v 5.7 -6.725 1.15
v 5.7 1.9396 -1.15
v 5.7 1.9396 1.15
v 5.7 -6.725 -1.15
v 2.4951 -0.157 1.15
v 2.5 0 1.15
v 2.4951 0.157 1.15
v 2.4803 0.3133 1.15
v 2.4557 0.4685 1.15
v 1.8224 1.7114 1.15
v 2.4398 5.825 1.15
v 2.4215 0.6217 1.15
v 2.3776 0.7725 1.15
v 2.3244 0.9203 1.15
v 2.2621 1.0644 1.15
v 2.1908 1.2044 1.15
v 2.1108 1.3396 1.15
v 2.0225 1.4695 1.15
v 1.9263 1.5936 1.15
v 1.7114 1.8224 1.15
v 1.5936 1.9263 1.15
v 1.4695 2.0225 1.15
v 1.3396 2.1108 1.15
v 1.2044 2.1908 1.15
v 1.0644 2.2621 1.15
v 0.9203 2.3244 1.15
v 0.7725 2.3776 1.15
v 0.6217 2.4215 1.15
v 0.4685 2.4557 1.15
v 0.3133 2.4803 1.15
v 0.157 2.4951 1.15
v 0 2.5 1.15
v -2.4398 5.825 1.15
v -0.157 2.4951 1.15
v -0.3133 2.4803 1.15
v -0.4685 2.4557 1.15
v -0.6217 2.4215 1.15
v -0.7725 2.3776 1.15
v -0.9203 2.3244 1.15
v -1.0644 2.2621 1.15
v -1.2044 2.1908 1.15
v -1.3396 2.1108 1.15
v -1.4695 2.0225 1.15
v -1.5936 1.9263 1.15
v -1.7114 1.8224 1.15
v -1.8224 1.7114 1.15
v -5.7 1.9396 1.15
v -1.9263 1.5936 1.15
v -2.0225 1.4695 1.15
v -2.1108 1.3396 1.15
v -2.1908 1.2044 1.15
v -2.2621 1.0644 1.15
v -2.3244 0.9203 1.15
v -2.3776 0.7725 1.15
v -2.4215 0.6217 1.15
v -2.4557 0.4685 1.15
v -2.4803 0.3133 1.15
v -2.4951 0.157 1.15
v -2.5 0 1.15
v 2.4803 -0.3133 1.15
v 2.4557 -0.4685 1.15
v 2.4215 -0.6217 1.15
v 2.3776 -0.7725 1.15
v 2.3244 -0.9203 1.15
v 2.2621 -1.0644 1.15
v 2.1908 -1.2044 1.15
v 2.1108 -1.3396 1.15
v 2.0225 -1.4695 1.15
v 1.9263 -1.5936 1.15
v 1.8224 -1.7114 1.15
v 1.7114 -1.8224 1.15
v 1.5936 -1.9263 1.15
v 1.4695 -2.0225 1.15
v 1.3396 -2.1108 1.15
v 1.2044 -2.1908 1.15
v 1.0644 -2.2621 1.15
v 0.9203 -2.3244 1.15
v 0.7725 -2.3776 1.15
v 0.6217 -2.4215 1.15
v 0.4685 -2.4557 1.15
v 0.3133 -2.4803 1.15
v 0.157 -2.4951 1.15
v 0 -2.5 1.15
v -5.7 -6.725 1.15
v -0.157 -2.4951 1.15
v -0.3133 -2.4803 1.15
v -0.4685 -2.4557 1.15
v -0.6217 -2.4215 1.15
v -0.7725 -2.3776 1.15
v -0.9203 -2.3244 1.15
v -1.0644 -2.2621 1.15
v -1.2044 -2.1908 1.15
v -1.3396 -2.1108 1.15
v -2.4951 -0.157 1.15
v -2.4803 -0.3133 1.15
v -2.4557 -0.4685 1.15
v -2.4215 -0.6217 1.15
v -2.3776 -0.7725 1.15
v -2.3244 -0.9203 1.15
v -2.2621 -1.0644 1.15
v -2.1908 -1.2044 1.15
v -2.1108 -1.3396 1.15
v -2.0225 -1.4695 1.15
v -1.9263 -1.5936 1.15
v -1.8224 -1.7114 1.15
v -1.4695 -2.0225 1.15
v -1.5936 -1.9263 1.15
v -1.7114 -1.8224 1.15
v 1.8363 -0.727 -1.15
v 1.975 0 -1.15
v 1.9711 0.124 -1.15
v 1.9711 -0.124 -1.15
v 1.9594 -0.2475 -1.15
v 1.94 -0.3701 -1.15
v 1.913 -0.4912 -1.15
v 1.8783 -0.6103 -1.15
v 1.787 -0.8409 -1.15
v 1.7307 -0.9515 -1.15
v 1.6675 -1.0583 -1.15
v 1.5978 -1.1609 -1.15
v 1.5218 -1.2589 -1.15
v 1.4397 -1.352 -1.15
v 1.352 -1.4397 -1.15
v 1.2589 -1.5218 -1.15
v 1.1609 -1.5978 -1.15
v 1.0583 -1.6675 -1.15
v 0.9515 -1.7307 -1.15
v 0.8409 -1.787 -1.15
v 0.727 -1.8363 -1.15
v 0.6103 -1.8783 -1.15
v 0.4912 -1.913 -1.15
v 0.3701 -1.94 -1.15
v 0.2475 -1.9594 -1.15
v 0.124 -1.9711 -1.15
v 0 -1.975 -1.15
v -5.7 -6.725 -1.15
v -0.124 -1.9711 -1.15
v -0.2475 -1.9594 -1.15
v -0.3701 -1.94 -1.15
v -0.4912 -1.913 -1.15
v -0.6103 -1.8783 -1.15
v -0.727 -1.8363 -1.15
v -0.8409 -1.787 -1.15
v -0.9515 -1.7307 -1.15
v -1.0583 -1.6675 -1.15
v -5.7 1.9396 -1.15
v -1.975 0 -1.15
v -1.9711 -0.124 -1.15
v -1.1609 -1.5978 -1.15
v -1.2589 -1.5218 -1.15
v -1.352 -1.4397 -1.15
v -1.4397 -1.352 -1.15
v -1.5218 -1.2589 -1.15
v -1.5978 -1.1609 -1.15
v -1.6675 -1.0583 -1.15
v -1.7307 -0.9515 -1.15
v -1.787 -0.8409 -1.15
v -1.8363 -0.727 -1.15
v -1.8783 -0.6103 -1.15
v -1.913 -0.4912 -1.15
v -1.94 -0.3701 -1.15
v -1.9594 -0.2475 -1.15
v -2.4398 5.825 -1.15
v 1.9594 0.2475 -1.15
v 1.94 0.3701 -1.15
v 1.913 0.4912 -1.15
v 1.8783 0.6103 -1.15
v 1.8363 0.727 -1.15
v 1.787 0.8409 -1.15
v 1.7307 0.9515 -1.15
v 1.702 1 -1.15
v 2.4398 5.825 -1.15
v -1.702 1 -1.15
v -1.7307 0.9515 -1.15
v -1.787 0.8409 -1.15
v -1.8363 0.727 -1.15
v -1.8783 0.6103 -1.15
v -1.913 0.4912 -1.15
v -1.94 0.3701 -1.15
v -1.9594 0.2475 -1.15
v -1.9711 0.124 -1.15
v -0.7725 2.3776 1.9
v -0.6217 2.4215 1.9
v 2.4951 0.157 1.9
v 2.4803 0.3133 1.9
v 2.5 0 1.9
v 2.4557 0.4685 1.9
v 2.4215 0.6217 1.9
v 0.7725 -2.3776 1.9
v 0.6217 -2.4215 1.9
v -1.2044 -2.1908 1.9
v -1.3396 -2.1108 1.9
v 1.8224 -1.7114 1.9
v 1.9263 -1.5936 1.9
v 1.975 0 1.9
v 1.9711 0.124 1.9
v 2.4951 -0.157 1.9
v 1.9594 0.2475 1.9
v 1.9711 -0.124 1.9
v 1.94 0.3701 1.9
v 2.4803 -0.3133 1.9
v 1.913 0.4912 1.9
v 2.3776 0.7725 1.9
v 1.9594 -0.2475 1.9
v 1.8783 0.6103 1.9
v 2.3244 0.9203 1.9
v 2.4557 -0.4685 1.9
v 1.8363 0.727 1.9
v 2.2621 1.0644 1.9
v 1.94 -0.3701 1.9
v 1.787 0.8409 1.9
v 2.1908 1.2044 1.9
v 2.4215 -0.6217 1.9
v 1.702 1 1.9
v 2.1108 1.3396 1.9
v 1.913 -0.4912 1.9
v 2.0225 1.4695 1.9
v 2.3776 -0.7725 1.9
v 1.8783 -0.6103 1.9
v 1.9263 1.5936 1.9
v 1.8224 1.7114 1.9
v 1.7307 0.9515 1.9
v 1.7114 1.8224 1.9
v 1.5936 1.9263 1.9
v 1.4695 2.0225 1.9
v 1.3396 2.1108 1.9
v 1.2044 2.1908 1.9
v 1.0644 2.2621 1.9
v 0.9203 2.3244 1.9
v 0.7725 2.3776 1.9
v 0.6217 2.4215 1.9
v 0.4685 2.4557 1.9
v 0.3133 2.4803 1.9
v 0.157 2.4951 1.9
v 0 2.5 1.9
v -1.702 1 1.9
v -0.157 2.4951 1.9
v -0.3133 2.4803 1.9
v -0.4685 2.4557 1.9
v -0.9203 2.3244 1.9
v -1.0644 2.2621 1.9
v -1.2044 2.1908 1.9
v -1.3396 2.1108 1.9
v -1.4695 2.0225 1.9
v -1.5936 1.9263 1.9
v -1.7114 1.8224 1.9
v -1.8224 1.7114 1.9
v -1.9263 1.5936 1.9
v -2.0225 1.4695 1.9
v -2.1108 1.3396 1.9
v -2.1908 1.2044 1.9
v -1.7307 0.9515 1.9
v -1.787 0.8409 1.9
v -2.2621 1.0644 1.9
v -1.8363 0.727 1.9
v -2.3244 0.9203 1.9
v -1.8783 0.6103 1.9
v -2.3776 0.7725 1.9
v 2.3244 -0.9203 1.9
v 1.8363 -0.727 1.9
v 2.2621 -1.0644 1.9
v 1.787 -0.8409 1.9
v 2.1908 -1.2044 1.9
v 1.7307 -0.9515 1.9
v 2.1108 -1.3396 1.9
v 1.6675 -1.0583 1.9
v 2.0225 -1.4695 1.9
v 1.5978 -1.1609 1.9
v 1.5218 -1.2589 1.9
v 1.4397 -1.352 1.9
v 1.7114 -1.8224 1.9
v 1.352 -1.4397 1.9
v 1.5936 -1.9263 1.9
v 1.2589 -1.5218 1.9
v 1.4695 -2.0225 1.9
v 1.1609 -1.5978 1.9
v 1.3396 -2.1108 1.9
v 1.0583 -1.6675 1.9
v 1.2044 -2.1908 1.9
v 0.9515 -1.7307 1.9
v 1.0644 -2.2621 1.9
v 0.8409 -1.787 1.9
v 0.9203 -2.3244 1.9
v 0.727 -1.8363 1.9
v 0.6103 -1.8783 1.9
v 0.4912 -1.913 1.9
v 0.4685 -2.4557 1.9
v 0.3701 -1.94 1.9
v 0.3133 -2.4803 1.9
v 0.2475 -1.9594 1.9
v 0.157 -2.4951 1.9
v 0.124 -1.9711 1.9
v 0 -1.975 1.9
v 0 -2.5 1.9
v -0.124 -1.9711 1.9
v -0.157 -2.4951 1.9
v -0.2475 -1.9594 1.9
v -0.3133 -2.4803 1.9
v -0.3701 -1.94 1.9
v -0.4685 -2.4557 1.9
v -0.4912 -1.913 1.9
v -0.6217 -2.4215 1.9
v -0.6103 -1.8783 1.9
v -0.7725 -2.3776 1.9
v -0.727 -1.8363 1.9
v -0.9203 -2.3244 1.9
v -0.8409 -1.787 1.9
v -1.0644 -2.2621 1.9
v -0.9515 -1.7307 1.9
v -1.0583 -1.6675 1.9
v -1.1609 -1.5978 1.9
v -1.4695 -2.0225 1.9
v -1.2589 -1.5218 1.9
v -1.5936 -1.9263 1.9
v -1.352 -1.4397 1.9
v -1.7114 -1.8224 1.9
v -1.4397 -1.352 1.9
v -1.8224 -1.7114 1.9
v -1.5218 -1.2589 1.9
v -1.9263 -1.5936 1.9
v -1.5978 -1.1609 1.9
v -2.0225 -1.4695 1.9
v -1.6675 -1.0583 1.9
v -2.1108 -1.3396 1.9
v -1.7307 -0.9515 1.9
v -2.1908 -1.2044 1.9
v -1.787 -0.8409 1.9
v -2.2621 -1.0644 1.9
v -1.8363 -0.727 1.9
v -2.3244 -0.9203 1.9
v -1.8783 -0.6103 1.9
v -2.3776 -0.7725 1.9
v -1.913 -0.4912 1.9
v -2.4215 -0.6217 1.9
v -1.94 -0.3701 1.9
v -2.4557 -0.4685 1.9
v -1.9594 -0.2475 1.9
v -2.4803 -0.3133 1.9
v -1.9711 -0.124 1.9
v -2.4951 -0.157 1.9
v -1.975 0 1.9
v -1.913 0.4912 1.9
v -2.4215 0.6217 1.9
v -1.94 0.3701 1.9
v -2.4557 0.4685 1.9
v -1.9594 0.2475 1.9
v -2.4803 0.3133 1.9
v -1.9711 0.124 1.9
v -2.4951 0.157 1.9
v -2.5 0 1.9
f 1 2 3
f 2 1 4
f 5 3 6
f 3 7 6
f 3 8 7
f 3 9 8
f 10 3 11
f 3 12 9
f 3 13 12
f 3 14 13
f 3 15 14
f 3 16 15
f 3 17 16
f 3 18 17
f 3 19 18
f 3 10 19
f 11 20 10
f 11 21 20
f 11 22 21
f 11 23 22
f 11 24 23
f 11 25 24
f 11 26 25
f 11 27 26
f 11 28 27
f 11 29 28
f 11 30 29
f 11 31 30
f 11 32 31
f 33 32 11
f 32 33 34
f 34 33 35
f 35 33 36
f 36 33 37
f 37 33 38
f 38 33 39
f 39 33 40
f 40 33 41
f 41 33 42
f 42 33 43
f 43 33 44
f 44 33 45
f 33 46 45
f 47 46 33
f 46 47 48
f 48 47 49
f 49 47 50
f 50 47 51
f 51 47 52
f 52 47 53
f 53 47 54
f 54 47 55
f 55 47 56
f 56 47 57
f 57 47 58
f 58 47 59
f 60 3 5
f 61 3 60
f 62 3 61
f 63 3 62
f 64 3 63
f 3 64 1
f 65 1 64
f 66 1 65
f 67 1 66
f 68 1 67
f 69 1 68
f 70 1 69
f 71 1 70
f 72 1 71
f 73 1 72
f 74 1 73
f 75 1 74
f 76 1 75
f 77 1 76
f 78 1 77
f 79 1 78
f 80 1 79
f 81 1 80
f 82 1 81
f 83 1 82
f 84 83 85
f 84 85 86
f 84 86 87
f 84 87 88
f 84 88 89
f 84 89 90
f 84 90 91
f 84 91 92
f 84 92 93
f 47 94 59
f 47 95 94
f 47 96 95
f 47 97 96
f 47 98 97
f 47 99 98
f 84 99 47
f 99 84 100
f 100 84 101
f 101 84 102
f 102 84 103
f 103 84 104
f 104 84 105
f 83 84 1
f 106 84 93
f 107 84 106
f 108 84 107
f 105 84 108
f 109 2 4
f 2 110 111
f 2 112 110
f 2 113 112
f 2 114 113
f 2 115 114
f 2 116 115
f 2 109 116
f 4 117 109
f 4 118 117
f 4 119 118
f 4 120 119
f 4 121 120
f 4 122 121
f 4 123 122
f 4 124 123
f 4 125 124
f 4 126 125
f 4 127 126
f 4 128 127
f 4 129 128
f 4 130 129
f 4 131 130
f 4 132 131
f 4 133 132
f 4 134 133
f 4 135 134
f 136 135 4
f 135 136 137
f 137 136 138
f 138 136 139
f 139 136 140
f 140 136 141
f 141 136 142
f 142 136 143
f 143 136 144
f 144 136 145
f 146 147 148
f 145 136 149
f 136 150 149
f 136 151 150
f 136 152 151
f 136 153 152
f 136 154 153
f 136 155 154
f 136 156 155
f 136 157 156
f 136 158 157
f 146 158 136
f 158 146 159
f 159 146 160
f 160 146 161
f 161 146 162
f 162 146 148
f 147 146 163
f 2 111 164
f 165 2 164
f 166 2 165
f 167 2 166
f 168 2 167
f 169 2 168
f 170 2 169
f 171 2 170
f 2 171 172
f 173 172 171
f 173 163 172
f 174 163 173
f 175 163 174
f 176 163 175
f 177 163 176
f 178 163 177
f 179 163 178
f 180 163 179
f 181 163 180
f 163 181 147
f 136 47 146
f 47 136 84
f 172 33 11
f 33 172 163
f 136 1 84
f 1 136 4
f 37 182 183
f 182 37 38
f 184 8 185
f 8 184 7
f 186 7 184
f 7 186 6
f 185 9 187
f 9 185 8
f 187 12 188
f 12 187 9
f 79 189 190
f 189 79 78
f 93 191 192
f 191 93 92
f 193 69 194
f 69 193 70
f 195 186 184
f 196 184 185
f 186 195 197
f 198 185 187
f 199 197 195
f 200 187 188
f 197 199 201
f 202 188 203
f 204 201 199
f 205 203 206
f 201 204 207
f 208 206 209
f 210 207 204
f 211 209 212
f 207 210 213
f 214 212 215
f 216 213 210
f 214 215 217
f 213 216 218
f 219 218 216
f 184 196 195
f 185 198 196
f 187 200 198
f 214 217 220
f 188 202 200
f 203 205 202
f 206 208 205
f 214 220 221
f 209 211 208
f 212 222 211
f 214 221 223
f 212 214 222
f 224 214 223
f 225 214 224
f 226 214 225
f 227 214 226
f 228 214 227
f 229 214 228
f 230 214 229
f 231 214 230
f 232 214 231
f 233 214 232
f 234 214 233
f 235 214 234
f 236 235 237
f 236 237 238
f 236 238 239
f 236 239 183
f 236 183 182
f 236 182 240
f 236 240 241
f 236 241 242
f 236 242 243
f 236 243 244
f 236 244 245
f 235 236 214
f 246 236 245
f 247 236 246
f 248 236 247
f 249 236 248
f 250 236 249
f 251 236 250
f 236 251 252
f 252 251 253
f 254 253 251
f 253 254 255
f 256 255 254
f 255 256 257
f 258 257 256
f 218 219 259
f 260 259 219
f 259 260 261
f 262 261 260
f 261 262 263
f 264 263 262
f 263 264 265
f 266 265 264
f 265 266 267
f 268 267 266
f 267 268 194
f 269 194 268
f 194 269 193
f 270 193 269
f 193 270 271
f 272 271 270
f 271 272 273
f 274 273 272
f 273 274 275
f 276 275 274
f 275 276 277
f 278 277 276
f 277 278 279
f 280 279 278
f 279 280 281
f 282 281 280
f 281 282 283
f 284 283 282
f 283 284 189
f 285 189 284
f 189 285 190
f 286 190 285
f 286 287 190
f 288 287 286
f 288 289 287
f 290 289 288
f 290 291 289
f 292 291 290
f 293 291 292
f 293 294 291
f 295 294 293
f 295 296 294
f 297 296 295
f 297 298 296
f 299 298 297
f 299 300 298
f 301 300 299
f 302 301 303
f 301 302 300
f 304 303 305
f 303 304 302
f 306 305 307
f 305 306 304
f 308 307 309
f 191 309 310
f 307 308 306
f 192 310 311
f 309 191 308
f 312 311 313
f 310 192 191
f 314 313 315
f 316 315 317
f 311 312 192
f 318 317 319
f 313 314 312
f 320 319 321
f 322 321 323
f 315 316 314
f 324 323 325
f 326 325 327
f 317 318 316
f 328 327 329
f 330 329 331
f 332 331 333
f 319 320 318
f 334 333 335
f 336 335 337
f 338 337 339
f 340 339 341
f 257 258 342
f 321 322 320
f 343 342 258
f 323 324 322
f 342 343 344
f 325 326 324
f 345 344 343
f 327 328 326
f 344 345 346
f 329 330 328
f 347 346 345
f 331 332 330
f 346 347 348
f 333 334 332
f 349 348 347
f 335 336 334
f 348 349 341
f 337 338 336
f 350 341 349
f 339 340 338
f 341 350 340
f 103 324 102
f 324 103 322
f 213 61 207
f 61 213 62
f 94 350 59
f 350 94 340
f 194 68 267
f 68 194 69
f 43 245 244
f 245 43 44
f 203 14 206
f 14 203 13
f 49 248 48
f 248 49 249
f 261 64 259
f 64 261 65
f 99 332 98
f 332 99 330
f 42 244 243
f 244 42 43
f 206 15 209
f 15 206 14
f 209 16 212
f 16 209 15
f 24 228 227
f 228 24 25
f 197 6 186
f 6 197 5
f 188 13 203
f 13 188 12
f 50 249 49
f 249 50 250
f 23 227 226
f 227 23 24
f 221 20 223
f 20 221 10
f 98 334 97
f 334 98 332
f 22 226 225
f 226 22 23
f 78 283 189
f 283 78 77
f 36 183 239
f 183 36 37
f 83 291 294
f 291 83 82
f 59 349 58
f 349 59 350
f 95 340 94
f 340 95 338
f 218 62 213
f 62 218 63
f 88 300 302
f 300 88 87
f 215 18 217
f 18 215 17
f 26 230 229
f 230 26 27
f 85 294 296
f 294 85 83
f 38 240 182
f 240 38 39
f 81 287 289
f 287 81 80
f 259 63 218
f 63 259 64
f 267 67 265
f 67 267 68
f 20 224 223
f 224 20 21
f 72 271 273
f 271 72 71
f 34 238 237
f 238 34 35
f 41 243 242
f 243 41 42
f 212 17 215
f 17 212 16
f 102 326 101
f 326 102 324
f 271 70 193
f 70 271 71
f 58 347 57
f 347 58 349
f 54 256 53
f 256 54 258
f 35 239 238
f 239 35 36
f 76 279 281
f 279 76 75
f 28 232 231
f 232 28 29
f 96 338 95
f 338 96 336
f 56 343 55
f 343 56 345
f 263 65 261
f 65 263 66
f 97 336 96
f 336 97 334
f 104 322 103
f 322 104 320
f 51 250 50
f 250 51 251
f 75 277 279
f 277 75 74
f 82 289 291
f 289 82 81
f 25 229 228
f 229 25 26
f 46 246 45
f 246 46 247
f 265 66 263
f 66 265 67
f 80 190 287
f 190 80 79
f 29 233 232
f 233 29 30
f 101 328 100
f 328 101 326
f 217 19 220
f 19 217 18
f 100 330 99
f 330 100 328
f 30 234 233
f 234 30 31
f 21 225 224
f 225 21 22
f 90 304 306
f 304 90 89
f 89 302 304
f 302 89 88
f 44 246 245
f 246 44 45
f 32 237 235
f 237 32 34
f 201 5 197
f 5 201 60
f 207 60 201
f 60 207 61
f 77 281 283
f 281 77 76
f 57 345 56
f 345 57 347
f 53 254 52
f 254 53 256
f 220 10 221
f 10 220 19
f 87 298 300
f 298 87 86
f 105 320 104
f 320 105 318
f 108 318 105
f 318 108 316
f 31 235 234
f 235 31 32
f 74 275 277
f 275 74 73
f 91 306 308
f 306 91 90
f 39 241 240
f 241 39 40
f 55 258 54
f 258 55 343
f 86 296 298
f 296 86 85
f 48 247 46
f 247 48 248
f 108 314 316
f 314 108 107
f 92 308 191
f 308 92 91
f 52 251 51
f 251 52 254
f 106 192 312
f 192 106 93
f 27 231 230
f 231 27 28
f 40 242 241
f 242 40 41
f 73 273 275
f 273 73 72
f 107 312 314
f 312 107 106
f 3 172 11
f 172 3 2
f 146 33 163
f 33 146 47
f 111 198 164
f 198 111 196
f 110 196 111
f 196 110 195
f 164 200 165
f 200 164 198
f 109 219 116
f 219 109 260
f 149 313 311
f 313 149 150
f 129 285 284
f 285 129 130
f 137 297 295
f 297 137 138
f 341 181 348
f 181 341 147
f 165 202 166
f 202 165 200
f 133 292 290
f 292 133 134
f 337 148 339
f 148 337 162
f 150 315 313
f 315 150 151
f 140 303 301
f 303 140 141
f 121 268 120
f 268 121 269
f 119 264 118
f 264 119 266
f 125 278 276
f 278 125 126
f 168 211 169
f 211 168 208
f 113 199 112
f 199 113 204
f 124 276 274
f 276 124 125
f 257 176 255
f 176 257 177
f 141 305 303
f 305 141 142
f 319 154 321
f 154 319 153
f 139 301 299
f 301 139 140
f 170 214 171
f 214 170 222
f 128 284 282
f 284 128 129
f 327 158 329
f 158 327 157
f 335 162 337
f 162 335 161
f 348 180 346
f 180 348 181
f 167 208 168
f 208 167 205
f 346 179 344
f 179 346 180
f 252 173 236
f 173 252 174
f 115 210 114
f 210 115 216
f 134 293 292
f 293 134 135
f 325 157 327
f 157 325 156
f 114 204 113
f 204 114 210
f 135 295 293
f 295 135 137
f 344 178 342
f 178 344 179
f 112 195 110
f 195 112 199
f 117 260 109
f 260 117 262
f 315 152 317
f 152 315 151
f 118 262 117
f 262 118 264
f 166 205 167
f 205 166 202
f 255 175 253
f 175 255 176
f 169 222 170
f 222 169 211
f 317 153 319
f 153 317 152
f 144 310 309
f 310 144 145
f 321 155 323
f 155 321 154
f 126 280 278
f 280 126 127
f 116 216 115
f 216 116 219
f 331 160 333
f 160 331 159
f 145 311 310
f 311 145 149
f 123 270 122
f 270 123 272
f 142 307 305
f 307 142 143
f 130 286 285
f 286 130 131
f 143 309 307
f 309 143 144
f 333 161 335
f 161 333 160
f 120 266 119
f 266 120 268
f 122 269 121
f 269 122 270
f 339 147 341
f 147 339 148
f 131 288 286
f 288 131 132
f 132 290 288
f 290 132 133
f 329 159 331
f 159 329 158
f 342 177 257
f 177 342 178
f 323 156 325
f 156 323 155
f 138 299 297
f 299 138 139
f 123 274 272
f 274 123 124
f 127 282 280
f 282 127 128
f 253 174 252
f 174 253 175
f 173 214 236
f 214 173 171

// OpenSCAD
module make_rotary_sensor_3382G_axle(buffer=0, length=50){
    
    difference(){
        color("blue")
        translate([0,0,0])
        cylinder(d=3.95-buffer/2, h=length, center=true, $fn=100);
        
        translate([0,10/2+1,0])
        color("green")
        cube([10,10,100],center=true);
    }
    
}

module make_rotary_sensor_3382G_bb(buffer=0, hole=0, extra_length=0){
    
    x = 7.4 + buffer/3;
    
    difference(){
        union(){
            color("red")
            translate([0,-0.45-extra_length/2,0])
            cube([11+buffer,12.15+buffer+extra_length,1.9+buffer],center=true);
            
            // external hole rim
            translate([0,0,(1.9+buffer+0.75)/2])
            cylinder(d=5, h=0.75, center=true, $fn=100);
        }
        
        for(i=[0:1])
        mirror([i,0,0])
        color("orange")
        translate([x,x,0])
        rotate([0,0,40])
        cube([10,10,10], center=true);
        
        if(hole)
        make_rotary_sensor_3382G_axle();
        
    }
    
}

if(0)
translate([0,-.63,0])
rotate([90,0,0])
import("sensor.stl");

make_rotary_sensor_3382G_bb(buffer=0.4, hole=1);
